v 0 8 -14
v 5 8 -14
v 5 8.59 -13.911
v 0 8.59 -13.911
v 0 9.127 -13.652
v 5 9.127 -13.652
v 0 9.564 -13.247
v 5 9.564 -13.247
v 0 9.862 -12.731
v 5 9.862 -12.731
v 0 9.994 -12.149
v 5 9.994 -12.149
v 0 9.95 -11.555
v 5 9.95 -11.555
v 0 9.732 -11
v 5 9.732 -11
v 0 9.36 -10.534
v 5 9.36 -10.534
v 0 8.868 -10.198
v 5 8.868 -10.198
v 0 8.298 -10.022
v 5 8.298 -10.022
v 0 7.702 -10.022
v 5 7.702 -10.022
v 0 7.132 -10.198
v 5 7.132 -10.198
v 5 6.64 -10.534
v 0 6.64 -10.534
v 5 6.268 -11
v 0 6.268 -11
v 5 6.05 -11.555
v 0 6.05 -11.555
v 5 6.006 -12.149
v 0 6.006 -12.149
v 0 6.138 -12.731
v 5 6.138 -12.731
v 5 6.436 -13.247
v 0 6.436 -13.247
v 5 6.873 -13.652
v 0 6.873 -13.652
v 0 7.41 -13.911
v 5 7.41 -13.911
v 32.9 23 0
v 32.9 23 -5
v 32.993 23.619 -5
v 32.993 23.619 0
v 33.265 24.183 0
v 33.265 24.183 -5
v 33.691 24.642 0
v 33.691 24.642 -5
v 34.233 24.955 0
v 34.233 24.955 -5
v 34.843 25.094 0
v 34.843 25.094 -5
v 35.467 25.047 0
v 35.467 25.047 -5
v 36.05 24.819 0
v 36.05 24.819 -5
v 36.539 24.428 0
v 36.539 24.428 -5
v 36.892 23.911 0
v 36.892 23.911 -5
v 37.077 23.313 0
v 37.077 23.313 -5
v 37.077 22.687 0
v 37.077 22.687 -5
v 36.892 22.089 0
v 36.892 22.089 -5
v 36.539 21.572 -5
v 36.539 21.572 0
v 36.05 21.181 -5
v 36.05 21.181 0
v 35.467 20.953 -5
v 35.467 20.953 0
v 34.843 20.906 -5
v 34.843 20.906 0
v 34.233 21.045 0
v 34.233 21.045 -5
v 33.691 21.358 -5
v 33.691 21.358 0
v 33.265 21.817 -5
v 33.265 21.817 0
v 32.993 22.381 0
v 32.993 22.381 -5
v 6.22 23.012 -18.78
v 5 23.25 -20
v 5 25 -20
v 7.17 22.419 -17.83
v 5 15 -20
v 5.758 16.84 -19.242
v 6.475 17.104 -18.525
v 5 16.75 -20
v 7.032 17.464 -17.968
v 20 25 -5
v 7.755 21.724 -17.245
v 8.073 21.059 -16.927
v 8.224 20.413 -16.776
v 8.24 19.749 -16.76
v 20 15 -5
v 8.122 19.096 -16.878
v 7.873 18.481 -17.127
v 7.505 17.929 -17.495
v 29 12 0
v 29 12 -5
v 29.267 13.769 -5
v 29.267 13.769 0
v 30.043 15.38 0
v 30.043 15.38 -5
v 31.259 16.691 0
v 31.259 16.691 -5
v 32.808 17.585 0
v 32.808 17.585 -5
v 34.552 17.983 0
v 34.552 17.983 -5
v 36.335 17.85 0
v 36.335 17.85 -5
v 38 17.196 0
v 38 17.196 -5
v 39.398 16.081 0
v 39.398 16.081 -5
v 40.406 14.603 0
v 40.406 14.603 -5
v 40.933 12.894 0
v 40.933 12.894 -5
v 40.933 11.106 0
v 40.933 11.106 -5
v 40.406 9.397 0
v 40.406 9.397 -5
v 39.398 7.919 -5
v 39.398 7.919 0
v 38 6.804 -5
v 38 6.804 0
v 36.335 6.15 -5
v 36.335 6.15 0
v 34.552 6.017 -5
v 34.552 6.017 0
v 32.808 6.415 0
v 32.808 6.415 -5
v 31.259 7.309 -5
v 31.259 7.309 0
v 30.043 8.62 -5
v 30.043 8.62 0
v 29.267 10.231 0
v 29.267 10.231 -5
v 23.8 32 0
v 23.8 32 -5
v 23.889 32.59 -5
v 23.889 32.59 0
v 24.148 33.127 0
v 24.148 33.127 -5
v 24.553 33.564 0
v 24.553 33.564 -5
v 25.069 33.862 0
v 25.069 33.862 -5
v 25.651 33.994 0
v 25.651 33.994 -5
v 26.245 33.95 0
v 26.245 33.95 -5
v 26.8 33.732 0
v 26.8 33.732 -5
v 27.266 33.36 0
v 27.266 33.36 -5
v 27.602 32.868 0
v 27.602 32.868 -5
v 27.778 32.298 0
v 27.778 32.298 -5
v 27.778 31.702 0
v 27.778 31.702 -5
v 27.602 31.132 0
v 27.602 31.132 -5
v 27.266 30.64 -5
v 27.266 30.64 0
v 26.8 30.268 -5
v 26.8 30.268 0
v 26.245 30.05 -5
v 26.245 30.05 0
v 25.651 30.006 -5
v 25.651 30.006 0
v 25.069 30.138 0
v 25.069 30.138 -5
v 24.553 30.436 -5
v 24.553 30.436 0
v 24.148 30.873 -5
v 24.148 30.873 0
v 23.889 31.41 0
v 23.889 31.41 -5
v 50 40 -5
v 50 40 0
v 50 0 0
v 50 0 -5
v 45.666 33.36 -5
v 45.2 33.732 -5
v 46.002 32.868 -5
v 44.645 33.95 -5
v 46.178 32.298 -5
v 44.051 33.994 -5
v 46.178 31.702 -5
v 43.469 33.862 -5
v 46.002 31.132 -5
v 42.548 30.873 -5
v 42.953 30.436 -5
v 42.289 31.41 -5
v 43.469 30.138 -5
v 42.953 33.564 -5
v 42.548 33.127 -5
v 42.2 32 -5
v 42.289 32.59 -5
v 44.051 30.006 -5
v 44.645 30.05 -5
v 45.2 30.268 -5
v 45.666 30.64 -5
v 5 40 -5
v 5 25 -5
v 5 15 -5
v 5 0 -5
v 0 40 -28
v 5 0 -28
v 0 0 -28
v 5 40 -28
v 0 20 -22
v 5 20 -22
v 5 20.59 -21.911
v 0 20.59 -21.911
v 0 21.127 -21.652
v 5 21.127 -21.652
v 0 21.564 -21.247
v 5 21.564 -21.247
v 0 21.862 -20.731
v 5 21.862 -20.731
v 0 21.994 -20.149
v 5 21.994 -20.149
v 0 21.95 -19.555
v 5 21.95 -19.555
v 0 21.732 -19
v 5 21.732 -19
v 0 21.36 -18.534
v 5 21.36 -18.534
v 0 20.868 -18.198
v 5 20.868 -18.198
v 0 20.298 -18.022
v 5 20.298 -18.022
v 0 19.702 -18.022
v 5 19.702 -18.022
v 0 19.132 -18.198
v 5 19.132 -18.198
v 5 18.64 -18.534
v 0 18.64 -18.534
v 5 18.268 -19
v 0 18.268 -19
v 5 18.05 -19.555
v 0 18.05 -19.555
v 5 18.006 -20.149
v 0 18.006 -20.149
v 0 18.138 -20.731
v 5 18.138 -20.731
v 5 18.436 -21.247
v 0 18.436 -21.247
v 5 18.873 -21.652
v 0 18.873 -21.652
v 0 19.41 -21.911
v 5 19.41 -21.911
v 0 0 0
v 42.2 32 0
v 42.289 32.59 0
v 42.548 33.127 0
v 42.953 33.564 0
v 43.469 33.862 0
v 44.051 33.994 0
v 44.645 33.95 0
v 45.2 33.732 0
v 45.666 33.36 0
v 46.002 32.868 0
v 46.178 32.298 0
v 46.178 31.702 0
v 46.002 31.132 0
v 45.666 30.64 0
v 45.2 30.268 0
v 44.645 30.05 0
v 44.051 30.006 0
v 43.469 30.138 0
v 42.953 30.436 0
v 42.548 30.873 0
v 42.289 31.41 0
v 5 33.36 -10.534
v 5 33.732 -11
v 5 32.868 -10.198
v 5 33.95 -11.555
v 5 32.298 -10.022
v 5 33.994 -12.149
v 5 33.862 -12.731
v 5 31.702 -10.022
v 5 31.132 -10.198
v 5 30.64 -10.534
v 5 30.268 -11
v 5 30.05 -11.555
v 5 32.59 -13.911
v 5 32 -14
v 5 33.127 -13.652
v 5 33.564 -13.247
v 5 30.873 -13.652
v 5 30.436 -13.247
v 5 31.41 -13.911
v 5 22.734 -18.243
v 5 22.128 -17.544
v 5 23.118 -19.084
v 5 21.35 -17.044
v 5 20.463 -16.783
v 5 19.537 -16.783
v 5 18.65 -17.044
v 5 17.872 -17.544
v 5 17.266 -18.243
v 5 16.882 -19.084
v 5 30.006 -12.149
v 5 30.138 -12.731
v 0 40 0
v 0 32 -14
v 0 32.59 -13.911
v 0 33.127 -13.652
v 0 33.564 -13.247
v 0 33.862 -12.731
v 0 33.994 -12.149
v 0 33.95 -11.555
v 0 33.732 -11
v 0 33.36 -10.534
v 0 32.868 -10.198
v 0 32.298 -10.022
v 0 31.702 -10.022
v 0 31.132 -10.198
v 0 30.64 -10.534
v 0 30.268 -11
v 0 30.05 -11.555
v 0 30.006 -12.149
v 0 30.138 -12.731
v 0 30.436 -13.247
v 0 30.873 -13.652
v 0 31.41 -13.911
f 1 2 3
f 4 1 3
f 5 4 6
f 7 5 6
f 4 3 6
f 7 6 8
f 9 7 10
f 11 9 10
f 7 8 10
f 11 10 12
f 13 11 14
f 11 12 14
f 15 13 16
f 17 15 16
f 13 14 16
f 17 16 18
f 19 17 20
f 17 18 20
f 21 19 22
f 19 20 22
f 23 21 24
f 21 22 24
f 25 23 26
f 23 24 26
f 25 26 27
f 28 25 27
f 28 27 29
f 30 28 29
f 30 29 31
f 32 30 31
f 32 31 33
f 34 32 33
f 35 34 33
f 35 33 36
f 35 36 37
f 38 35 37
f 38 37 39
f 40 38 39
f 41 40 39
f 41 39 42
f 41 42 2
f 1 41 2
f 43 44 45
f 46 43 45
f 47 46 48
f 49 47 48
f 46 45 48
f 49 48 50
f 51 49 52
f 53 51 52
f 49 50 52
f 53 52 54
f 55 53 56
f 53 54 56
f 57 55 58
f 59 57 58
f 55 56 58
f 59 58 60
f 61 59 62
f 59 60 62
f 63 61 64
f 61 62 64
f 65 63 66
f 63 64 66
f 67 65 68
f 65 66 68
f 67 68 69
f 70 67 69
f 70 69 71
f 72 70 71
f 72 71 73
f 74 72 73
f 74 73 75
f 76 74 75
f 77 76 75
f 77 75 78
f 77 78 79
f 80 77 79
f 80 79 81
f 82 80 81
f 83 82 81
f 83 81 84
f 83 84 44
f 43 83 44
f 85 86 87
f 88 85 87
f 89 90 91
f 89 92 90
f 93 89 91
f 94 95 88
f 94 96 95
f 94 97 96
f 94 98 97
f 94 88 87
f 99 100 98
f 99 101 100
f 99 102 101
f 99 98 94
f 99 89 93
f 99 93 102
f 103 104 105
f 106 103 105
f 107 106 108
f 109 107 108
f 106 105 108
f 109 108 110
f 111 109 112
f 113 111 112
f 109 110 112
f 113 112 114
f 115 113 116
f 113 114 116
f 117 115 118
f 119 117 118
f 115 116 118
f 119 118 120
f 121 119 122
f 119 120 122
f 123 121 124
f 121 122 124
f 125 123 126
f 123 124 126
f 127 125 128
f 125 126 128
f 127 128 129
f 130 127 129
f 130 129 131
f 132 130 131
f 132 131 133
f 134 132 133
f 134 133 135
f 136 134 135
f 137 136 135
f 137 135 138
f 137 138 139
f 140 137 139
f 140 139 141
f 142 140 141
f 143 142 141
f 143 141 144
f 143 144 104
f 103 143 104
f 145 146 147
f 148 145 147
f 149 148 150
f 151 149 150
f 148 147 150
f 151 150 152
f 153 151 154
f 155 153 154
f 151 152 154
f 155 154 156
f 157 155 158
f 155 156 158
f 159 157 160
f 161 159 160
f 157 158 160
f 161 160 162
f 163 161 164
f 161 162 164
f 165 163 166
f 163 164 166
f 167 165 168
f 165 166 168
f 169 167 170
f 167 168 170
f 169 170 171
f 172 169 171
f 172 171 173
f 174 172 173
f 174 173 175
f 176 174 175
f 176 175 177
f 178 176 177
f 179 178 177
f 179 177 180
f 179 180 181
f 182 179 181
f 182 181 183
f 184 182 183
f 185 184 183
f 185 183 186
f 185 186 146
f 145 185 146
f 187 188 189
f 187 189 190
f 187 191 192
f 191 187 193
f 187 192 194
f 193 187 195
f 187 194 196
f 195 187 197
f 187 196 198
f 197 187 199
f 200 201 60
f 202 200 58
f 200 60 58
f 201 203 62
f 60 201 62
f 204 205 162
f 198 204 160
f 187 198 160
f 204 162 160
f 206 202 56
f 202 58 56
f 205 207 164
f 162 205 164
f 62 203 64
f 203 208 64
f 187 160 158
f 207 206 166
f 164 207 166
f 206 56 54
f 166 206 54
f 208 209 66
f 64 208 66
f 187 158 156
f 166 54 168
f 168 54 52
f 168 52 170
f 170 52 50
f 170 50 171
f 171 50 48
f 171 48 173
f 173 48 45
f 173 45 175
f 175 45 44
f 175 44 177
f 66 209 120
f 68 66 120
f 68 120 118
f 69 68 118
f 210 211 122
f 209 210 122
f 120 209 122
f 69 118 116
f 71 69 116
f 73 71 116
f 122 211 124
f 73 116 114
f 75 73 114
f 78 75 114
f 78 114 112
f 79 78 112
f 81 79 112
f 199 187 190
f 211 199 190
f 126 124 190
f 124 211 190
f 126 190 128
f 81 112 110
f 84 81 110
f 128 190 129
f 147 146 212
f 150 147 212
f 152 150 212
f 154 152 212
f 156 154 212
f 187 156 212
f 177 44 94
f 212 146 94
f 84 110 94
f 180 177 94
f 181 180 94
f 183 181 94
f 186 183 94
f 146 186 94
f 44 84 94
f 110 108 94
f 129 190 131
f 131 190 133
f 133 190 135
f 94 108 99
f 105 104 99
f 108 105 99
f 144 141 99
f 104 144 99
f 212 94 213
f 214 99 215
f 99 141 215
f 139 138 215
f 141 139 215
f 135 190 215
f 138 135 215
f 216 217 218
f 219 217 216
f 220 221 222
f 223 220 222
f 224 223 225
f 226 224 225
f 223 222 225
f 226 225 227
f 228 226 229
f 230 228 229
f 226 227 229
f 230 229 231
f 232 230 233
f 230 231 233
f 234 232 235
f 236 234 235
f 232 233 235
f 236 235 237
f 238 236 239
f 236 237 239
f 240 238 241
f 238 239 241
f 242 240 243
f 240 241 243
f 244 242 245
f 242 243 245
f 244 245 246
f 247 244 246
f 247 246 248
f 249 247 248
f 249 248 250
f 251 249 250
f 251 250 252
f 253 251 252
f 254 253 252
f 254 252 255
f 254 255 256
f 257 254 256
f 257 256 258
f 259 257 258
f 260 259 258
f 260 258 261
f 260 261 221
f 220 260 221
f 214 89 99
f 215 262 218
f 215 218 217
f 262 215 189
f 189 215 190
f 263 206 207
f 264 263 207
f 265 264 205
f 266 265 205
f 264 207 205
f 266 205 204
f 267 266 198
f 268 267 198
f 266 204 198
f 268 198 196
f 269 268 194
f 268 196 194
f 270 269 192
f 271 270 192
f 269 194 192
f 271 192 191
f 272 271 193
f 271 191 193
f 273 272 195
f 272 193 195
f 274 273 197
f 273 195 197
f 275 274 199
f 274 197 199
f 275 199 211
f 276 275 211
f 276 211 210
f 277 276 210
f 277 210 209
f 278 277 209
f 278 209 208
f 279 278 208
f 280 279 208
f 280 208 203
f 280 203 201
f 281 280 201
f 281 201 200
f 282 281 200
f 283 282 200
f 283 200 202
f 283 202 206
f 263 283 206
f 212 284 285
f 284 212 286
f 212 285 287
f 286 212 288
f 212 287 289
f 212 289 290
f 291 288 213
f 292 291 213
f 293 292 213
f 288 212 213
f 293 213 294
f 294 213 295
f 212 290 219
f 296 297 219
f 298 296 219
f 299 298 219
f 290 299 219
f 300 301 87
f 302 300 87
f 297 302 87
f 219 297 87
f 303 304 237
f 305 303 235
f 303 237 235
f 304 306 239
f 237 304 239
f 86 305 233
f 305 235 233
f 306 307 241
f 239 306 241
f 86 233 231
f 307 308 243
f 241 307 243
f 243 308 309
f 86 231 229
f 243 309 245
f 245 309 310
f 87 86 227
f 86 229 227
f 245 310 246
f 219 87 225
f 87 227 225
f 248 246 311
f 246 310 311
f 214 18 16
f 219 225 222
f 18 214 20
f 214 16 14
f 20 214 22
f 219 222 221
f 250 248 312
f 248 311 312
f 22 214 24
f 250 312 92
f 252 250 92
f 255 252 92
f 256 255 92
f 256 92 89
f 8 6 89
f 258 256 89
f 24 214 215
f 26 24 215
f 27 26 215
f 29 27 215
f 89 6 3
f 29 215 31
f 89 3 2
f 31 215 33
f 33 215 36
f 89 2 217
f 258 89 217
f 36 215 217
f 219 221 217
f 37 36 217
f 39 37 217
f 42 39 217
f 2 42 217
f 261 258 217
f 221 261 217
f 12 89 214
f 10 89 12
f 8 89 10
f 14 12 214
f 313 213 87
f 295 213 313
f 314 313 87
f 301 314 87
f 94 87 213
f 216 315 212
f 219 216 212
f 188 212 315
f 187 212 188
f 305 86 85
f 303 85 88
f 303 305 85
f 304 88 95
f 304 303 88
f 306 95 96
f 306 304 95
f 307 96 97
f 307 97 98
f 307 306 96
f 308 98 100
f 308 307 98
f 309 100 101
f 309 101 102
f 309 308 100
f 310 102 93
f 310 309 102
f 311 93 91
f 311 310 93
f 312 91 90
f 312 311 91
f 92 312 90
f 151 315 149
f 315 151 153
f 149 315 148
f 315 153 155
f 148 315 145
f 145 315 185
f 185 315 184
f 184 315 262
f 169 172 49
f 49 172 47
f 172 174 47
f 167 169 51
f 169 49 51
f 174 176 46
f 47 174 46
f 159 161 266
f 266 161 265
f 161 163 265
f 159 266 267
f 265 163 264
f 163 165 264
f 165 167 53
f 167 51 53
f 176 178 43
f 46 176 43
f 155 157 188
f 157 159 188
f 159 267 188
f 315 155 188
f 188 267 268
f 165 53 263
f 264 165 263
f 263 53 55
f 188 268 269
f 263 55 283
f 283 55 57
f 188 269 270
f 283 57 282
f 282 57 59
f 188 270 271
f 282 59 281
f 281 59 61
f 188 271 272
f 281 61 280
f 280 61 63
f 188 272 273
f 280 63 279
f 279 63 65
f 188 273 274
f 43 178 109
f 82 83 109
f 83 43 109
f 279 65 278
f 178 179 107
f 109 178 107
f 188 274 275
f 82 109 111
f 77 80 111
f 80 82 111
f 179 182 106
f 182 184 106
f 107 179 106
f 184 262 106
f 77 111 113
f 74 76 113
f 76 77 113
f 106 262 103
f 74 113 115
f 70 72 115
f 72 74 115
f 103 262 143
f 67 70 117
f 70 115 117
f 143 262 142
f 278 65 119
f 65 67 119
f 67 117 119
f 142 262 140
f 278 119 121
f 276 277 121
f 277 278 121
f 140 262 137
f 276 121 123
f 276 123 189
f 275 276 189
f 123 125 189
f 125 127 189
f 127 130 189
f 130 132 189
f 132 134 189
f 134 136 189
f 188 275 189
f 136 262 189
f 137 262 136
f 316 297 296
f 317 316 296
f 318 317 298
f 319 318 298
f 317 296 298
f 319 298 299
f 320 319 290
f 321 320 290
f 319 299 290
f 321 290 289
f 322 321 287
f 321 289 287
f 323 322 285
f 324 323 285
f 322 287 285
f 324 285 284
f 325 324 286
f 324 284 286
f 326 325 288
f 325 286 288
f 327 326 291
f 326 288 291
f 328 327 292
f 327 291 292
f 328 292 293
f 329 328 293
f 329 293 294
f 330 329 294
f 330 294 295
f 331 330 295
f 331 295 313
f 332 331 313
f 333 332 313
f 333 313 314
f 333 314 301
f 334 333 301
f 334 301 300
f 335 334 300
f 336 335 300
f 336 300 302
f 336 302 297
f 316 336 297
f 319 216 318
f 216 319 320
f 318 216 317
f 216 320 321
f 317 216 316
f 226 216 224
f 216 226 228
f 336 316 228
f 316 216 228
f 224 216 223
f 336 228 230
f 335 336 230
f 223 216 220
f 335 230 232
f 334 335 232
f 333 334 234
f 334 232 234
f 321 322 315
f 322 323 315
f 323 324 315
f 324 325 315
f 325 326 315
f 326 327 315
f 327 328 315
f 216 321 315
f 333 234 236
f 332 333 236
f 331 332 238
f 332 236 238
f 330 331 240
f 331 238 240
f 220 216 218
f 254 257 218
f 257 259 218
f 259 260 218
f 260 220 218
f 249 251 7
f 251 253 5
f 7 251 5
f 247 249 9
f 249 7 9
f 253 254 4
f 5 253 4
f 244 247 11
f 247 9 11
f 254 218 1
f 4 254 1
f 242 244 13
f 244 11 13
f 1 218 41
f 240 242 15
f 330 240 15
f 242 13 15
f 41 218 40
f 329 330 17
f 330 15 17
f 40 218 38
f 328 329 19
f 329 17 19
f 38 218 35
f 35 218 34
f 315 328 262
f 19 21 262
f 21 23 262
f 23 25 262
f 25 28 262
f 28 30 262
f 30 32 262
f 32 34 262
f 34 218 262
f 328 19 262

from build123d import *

# Parameters (mm, degrees)
BOSS_EXTRUDE2_DEPTH = 40
SKETCH3_R           = 6
SKETCH3_R_2         = 2.1
SKETCH3_R_3         = 2
CUT_EXTRUDE1_DEPTH  = 71.710678119
SKETCH4_R           = 2
CUT_EXTRUDE3_DEPTH  = 10
RIB3_REACH          = 66.226
SKETCH7_WALL_W      = 151.665529222
SKETCH7_WALL_H      = 10
SKETCH8_W           = 7
SKETCH8_H           = 40
CUT_EXTRUDE4_DEPTH  = 70.641941386
SKETCH9_R           = 3.25
CUT_EXTRUDE5_DEPTH  = 67.400301204
SKETCH10_R          = 2
CUT_EXTRUDE6_DEPTH  = 67.400301204


with BuildPart() as part:
    # Sketch1 → Boss-Extrude2 (new body)
    with BuildSketch(Plane(origin=(0, 0, 0), x_dir=(1, 0, 0), z_dir=(0, 1, 0))):
        Polygon((0, 0), (50, 0), (50, 5), (5, 5), (5, 35), (0, 35), align=None)
    extrude(amount=BOSS_EXTRUDE2_DEPTH)

    # Sketch3 → Cut-Extrude1 (cut, through all)
    with BuildSketch(Plane(origin=(0, 0, -5), x_dir=(-1, 0, 0), z_dir=(0, 0, -1))):
        with Locations((-35, 12)):
            Circle(SKETCH3_R)
        with Locations((-35, 23)):
            Circle(SKETCH3_R_2)
        with Locations((-44.2, 32)):
            Circle(SKETCH3_R_3)
        with Locations((-25.8, 32)):
            Circle(SKETCH3_R_3)
    extrude(amount=-CUT_EXTRUDE1_DEPTH, mode=Mode.SUBTRACT)

    # Sketch4 → Cut-Extrude3 (cut)
    with BuildSketch(Plane(origin=(5, 0, 0), x_dir=(0, 0, -1), z_dir=(1, 0, 0))):
        with Locations((12, 32)):
            Circle(SKETCH4_R)
        with Locations((12, 8)):
            Circle(SKETCH4_R)
    extrude(amount=-CUT_EXTRUDE3_DEPTH, mode=Mode.SUBTRACT)

    # Sketch7 wall → Rib3 (add, up to next)
    with BuildSketch(Plane(origin=(12.5, 20, -12.5), x_dir=(0.707106781187, 0, 0.707106781187), z_dir=(0.707106781187, 0, -0.707106781187)), mode=Mode.PRIVATE) as rib3_sk1:
        Rectangle(SKETCH7_WALL_W, SKETCH7_WALL_H)
    rib3_tool1 = extrude(rib3_sk1.sketch, amount=-RIB3_REACH, mode=Mode.PRIVATE) - part.part
    add(rib3_tool1.solids().sort_by_distance((12.5, 20, -12.5))[0])

    # Sketch8 → Cut-Extrude4 (cut, through all)
    with BuildSketch(Plane(origin=(5, 0, 0), x_dir=(0, 0, -1), z_dir=(1, 0, 0))):
        with Locations((31.5, 20)):
            Rectangle(SKETCH8_W, SKETCH8_H)
    extrude(amount=-CUT_EXTRUDE4_DEPTH, mode=Mode.SUBTRACT)

    # Sketch9 → Cut-Extrude5 (cut, through all)
    with BuildSketch(Plane(origin=(5, 0, 0), x_dir=(0, 0, -1), z_dir=(1, 0, 0))):
        with Locations((20, 20)):
            Circle(SKETCH9_R)
    extrude(amount=CUT_EXTRUDE5_DEPTH, mode=Mode.SUBTRACT)

    # Sketch10 → Cut-Extrude6 (cut, through all)
    with BuildSketch(Plane(origin=(5, 0, 0), x_dir=(0, 0, -1), z_dir=(1, 0, 0))):
        with Locations((20, 20)):
            Circle(SKETCH10_R)
    extrude(amount=-CUT_EXTRUDE6_DEPTH, mode=Mode.SUBTRACT)


solid = part.part
